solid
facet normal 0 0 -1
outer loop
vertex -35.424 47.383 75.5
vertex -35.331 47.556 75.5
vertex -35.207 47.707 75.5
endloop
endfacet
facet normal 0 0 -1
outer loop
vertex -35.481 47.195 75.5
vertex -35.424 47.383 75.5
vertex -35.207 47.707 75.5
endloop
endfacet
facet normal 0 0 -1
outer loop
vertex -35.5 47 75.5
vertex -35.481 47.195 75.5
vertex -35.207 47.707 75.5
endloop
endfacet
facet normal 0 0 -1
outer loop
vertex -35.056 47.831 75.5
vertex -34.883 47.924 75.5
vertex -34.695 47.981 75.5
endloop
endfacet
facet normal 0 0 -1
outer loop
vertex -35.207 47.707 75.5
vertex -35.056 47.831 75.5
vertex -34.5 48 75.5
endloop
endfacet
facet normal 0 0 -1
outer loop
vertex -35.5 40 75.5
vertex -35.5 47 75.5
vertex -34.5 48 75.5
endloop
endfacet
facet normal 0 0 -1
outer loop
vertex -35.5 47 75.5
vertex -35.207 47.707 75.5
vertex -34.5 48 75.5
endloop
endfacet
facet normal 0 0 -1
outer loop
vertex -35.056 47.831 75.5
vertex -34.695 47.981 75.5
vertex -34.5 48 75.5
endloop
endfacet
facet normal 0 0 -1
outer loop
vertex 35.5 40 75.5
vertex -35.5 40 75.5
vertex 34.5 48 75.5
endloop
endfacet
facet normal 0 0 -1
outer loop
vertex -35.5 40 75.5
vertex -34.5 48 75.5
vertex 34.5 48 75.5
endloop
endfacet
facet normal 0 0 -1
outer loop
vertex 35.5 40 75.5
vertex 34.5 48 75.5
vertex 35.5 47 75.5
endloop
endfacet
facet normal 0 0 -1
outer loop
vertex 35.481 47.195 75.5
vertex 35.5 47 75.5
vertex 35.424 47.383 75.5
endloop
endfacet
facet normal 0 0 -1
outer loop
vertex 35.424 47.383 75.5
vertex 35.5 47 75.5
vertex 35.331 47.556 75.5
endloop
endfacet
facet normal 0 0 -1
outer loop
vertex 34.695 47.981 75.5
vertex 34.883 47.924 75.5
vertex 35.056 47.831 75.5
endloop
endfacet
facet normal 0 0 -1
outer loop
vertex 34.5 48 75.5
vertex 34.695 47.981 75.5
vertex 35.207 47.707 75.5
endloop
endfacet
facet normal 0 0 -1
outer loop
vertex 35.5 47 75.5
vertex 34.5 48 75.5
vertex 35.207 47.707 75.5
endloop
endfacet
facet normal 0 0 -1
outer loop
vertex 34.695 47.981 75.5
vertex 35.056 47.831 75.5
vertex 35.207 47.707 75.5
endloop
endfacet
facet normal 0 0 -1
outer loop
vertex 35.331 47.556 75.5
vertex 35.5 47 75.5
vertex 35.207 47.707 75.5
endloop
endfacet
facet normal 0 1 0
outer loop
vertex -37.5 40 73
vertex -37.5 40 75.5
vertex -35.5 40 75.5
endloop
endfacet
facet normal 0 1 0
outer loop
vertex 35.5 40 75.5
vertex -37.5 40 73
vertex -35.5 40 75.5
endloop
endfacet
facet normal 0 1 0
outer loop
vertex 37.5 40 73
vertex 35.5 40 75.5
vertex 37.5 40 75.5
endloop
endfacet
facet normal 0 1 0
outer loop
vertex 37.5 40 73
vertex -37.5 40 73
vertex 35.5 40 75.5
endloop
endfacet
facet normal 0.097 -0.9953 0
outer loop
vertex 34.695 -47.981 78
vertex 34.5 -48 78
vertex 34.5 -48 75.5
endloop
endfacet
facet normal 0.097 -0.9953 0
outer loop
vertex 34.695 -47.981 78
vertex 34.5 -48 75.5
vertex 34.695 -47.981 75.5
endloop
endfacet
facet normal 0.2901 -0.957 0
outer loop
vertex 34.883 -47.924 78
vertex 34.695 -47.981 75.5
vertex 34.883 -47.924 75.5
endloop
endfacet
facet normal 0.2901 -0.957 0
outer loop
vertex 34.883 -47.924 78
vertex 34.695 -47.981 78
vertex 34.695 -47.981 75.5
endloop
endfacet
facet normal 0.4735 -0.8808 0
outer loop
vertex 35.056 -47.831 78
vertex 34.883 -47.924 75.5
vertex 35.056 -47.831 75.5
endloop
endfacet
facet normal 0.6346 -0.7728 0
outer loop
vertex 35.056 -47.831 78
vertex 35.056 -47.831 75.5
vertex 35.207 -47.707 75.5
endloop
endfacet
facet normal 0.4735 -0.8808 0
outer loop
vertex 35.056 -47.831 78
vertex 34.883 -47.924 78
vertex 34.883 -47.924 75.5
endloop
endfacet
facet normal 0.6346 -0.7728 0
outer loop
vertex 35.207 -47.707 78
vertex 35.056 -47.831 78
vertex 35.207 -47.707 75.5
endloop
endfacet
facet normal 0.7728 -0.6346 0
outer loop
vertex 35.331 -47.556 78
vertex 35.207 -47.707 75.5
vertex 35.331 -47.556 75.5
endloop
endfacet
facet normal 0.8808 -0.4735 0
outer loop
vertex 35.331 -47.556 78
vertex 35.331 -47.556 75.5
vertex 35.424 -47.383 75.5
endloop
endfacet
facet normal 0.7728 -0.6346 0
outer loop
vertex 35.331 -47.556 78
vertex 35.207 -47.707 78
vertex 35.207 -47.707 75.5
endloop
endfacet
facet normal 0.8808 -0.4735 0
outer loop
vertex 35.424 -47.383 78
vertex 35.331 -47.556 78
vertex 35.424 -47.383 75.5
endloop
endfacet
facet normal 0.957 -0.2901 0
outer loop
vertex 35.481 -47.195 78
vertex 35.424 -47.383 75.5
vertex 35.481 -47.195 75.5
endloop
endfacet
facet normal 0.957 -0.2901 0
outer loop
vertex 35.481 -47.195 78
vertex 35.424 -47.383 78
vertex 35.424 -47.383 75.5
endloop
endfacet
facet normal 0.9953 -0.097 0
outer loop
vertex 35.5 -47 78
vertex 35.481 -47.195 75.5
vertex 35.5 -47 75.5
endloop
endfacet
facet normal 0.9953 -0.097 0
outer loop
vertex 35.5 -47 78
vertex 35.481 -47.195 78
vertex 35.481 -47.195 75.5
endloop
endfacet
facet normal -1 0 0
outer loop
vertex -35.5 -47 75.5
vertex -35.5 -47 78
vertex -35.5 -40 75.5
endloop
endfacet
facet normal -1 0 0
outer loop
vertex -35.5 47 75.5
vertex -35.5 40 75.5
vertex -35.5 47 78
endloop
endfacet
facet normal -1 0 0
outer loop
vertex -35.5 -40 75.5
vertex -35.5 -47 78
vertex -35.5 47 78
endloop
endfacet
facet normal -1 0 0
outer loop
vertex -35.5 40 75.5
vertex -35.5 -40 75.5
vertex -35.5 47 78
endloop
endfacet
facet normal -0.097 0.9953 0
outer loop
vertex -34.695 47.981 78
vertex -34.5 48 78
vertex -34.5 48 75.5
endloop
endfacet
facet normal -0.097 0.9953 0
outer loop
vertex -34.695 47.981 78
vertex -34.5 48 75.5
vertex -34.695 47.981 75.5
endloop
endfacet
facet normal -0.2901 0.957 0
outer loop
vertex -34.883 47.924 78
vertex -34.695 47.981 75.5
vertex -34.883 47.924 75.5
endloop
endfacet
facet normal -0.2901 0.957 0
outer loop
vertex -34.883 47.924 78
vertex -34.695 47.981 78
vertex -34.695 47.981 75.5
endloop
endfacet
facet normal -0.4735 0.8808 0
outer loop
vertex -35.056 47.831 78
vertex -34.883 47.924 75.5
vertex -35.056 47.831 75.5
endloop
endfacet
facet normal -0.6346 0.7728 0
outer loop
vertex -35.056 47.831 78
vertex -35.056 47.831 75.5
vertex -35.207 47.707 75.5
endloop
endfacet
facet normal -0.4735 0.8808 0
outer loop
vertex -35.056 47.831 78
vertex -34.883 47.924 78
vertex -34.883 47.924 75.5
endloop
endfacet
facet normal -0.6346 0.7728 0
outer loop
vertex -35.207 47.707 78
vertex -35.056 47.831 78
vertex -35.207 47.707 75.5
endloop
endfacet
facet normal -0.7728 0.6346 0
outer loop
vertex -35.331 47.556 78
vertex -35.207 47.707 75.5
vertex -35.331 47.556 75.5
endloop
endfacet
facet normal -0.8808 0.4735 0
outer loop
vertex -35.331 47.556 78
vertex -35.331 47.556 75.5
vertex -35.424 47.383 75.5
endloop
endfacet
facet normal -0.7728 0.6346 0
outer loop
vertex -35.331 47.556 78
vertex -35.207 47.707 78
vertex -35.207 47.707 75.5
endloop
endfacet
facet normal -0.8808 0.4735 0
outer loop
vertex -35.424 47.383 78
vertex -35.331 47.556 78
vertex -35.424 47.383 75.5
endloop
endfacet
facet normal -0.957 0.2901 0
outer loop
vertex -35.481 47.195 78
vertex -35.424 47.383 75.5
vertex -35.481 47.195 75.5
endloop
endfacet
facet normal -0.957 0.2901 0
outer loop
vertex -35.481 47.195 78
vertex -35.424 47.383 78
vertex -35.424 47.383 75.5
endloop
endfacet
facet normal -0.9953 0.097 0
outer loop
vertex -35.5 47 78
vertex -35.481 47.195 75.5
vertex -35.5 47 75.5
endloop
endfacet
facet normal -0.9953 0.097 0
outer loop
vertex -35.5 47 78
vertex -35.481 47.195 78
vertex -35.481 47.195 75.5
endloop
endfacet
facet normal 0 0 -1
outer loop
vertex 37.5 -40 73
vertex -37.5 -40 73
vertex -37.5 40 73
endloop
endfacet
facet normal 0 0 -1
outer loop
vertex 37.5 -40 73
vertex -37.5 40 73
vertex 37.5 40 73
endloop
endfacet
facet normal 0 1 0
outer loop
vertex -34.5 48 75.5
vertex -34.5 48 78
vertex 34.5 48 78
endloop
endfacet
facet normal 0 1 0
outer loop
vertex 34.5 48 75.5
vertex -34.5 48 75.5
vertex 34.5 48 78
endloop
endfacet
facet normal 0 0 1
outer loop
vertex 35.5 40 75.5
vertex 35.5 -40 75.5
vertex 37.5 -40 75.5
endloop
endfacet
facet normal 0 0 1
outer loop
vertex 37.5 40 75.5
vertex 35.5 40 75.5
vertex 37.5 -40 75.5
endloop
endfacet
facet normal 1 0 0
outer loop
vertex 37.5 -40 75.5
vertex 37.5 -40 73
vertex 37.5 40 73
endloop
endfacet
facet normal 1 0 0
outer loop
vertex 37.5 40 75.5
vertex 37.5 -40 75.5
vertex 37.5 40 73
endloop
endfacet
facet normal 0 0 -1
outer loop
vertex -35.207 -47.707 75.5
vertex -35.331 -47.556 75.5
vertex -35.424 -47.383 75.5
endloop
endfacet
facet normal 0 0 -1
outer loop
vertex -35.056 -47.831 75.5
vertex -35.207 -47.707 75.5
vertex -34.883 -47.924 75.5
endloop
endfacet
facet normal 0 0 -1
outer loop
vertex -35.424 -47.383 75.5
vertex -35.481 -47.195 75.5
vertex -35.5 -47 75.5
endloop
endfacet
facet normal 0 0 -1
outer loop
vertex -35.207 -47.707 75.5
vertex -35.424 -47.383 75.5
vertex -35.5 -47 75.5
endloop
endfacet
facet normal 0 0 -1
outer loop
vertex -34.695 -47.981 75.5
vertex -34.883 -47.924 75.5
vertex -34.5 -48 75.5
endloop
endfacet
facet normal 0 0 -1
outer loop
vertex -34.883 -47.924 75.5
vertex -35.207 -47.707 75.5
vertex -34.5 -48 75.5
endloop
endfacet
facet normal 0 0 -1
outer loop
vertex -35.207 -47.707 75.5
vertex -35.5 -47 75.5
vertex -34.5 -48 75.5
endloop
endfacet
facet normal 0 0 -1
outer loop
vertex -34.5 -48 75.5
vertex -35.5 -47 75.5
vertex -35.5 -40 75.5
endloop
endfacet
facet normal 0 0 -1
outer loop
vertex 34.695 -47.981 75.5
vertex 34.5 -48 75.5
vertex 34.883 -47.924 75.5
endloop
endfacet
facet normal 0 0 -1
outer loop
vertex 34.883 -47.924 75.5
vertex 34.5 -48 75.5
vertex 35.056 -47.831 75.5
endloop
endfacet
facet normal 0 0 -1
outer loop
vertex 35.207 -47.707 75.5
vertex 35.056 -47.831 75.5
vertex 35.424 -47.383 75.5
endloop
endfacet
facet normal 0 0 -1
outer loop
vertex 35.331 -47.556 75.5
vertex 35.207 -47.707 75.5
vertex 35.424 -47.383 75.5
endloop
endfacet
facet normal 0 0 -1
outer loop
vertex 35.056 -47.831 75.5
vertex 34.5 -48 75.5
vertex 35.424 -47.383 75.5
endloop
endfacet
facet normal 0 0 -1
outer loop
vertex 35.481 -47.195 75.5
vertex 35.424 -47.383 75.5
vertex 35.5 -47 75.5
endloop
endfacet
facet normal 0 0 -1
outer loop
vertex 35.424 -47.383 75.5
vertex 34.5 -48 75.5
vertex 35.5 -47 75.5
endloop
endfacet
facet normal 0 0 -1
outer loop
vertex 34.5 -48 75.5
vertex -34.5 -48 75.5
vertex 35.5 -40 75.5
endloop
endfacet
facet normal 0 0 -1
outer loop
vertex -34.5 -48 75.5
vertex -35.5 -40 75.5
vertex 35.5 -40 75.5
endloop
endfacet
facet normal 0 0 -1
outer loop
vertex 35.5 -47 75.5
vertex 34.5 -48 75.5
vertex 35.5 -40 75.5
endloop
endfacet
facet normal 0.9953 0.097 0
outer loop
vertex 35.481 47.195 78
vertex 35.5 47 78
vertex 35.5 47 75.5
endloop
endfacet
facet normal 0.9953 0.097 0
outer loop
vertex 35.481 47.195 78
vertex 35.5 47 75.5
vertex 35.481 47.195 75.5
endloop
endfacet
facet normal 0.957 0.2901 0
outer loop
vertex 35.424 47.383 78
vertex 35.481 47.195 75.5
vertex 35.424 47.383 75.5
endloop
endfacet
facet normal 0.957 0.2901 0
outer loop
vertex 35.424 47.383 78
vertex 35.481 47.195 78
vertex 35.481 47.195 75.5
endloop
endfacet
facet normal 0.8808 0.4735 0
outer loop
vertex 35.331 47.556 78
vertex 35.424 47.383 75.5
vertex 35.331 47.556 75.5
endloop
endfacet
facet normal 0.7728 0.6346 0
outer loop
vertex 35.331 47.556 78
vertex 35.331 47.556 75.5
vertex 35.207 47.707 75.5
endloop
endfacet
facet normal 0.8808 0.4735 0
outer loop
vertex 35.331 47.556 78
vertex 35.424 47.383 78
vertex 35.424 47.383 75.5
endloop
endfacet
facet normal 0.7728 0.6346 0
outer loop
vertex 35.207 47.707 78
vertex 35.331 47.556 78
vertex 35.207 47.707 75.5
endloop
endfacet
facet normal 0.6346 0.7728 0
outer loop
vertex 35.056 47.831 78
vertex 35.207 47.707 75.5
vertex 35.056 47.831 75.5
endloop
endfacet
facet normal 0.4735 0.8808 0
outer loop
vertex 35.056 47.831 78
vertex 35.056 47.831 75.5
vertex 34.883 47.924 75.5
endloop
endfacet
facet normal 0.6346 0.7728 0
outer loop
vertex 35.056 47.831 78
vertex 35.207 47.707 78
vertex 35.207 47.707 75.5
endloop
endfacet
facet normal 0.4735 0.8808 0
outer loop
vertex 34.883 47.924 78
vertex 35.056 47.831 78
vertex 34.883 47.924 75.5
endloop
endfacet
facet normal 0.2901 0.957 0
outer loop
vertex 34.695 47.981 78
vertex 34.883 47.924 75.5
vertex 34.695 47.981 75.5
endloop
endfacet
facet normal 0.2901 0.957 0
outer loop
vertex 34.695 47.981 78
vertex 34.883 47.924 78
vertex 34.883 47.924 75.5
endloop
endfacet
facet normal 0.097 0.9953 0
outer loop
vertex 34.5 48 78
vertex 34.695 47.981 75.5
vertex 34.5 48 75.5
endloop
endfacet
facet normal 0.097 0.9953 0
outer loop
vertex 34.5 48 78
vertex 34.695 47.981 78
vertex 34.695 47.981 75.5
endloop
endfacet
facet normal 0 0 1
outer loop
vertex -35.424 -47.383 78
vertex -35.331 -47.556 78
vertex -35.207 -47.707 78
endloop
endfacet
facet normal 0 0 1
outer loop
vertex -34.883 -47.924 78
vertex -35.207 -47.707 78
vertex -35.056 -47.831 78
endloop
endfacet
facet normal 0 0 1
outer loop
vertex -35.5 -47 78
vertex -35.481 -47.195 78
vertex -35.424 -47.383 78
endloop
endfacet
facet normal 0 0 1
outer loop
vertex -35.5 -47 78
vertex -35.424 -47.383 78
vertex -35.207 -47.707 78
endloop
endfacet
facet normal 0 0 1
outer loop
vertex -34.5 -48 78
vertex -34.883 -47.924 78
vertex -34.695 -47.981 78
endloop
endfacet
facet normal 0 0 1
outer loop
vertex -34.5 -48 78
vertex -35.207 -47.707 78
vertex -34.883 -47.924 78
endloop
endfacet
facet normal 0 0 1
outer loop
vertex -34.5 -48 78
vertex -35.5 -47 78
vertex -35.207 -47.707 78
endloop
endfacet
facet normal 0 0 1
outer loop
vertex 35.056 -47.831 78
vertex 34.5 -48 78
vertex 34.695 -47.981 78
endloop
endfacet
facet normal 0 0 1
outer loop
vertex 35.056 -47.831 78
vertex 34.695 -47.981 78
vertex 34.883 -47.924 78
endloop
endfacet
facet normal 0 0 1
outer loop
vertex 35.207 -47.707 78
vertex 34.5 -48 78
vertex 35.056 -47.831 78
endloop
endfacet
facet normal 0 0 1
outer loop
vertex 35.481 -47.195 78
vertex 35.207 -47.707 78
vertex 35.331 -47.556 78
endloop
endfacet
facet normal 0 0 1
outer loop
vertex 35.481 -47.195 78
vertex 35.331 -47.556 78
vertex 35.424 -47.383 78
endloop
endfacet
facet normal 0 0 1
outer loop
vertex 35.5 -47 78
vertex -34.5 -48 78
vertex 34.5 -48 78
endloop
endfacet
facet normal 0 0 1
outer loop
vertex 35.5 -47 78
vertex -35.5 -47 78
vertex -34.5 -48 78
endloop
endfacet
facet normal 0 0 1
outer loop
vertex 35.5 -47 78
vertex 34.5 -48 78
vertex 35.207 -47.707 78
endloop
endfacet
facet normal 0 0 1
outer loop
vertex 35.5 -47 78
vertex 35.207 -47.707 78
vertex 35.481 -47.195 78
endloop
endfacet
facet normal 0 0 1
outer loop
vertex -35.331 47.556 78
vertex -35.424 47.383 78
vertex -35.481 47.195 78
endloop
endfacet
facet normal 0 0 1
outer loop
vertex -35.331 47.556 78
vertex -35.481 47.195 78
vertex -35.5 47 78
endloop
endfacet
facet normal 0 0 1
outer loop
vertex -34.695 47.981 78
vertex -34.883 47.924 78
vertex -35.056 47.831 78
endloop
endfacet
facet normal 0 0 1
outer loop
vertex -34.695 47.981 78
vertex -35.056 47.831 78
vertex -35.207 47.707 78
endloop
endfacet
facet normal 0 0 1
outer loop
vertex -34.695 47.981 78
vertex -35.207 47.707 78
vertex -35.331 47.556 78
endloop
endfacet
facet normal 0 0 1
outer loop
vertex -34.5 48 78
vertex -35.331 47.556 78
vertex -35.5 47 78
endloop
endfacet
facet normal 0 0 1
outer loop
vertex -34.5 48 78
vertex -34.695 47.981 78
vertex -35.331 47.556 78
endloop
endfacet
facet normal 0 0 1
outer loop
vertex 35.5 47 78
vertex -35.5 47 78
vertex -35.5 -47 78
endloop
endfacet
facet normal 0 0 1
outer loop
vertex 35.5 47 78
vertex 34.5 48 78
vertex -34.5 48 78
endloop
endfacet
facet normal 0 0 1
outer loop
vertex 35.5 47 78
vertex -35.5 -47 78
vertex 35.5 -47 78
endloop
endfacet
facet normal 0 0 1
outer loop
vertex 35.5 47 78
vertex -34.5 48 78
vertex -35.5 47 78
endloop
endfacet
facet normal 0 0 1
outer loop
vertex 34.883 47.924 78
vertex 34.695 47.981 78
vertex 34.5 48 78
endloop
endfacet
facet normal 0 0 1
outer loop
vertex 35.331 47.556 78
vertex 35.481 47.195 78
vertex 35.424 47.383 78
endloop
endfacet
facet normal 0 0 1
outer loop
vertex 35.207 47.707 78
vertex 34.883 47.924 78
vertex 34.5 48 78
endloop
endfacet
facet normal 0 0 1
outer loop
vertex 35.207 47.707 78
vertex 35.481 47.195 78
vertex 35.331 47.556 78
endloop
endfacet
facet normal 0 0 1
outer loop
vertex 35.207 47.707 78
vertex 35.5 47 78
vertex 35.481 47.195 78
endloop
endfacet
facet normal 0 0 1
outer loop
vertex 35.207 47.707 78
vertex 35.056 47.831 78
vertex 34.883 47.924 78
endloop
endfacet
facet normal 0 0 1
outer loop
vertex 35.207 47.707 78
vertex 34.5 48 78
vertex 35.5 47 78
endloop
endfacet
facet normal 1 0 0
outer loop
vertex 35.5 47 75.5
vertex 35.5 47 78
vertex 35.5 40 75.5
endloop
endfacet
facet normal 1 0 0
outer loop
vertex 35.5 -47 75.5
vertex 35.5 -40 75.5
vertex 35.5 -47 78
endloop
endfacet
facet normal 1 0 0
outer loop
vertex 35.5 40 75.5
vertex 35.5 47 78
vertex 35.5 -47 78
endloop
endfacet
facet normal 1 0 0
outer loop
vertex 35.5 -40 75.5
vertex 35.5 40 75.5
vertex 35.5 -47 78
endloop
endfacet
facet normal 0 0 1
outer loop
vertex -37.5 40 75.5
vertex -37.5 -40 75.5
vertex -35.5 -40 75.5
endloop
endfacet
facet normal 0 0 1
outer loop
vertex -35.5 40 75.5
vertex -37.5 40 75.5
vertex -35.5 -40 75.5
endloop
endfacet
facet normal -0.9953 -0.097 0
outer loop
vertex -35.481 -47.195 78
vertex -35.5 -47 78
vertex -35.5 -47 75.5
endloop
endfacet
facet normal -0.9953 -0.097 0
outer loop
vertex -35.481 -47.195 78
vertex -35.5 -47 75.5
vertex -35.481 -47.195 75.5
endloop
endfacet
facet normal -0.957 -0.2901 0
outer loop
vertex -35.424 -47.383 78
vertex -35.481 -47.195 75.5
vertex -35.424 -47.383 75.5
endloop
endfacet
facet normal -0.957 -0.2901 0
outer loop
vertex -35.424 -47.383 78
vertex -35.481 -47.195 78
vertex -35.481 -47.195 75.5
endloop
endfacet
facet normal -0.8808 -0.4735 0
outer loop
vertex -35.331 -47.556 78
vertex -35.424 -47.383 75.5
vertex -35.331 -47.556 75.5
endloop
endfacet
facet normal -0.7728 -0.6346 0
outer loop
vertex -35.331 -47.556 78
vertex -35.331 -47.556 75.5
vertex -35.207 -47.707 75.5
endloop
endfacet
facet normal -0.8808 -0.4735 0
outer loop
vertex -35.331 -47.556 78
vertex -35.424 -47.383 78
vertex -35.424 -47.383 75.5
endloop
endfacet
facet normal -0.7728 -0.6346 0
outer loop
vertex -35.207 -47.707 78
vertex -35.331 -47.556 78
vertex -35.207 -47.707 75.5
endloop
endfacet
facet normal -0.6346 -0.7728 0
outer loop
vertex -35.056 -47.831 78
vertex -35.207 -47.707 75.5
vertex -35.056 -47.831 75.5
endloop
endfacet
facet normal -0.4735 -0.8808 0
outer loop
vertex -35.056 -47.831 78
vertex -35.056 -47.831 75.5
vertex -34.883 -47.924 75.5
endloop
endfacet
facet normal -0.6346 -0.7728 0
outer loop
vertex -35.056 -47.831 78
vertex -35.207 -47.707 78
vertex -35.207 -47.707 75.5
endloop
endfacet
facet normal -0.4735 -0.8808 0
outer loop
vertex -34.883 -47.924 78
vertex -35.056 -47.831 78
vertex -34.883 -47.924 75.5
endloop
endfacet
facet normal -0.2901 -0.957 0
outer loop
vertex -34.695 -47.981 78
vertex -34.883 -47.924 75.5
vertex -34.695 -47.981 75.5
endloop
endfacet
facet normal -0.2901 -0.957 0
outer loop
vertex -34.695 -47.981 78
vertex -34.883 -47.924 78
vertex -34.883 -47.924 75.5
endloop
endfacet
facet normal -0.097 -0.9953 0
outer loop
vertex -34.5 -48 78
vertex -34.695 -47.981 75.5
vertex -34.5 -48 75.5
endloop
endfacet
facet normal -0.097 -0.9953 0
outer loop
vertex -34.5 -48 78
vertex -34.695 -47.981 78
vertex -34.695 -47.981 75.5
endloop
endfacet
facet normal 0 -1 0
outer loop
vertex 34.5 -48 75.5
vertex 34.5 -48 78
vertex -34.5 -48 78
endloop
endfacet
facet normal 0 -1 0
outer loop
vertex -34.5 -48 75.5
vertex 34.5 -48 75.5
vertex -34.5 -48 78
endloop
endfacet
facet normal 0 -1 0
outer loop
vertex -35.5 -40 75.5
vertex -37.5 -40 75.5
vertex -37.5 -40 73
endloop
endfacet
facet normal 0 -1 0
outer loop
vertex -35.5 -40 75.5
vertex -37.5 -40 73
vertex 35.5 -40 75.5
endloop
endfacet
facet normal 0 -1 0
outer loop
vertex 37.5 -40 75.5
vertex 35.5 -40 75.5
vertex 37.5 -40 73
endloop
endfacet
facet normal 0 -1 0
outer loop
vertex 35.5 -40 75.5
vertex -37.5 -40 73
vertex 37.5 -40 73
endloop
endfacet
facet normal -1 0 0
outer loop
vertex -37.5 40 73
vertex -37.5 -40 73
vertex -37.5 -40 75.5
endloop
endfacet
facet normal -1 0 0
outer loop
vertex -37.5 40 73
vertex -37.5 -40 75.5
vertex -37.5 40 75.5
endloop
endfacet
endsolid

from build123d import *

# Parameters (mm, degrees)
SKETCH006_W      = 75
SKETCH006_H      = 80
EXTRUDE005_DEPTH = 2.5
EXTRUDE006_DEPTH = 2.5


with BuildPart() as extrude005:
    # Sketch006 (on Face34 of XOR001) → Extrude005 (new body)
    with BuildSketch(Plane.XY.offset(73)):
        Rectangle(SKETCH006_W, SKETCH006_H)
    extrude(amount=EXTRUDE005_DEPTH)


with BuildPart() as fusion:
    # Sketch007 (on Face5 of XOR001) → Extrude006 (new body)
    with BuildSketch(Plane.XY.offset(78)):
        with BuildLine():
            ThreePointArc((-34.5, 48), (-35.207107, 47.707107), (-35.5, 47))
            Line((-35.5, -47), (-35.5, 47))
            ThreePointArc((-35.5, -47), (-35.207107, -47.707107), (-34.5, -48))
            Line((34.5, -48), (-34.5, -48))
            ThreePointArc((34.5, -48), (35.207107, -47.707107), (35.5, -47))
            Line((35.5, 47), (35.5, -47))
            ThreePointArc((35.5, 47), (35.207107, 47.707107), (34.5, 48))
            Line((-34.5, 48), (34.5, 48))
        make_face()
    extrude(amount=-EXTRUDE006_DEPTH)

    # Fusion: union Extrude005
    add(extrude005.part)


solid = fusion.part
